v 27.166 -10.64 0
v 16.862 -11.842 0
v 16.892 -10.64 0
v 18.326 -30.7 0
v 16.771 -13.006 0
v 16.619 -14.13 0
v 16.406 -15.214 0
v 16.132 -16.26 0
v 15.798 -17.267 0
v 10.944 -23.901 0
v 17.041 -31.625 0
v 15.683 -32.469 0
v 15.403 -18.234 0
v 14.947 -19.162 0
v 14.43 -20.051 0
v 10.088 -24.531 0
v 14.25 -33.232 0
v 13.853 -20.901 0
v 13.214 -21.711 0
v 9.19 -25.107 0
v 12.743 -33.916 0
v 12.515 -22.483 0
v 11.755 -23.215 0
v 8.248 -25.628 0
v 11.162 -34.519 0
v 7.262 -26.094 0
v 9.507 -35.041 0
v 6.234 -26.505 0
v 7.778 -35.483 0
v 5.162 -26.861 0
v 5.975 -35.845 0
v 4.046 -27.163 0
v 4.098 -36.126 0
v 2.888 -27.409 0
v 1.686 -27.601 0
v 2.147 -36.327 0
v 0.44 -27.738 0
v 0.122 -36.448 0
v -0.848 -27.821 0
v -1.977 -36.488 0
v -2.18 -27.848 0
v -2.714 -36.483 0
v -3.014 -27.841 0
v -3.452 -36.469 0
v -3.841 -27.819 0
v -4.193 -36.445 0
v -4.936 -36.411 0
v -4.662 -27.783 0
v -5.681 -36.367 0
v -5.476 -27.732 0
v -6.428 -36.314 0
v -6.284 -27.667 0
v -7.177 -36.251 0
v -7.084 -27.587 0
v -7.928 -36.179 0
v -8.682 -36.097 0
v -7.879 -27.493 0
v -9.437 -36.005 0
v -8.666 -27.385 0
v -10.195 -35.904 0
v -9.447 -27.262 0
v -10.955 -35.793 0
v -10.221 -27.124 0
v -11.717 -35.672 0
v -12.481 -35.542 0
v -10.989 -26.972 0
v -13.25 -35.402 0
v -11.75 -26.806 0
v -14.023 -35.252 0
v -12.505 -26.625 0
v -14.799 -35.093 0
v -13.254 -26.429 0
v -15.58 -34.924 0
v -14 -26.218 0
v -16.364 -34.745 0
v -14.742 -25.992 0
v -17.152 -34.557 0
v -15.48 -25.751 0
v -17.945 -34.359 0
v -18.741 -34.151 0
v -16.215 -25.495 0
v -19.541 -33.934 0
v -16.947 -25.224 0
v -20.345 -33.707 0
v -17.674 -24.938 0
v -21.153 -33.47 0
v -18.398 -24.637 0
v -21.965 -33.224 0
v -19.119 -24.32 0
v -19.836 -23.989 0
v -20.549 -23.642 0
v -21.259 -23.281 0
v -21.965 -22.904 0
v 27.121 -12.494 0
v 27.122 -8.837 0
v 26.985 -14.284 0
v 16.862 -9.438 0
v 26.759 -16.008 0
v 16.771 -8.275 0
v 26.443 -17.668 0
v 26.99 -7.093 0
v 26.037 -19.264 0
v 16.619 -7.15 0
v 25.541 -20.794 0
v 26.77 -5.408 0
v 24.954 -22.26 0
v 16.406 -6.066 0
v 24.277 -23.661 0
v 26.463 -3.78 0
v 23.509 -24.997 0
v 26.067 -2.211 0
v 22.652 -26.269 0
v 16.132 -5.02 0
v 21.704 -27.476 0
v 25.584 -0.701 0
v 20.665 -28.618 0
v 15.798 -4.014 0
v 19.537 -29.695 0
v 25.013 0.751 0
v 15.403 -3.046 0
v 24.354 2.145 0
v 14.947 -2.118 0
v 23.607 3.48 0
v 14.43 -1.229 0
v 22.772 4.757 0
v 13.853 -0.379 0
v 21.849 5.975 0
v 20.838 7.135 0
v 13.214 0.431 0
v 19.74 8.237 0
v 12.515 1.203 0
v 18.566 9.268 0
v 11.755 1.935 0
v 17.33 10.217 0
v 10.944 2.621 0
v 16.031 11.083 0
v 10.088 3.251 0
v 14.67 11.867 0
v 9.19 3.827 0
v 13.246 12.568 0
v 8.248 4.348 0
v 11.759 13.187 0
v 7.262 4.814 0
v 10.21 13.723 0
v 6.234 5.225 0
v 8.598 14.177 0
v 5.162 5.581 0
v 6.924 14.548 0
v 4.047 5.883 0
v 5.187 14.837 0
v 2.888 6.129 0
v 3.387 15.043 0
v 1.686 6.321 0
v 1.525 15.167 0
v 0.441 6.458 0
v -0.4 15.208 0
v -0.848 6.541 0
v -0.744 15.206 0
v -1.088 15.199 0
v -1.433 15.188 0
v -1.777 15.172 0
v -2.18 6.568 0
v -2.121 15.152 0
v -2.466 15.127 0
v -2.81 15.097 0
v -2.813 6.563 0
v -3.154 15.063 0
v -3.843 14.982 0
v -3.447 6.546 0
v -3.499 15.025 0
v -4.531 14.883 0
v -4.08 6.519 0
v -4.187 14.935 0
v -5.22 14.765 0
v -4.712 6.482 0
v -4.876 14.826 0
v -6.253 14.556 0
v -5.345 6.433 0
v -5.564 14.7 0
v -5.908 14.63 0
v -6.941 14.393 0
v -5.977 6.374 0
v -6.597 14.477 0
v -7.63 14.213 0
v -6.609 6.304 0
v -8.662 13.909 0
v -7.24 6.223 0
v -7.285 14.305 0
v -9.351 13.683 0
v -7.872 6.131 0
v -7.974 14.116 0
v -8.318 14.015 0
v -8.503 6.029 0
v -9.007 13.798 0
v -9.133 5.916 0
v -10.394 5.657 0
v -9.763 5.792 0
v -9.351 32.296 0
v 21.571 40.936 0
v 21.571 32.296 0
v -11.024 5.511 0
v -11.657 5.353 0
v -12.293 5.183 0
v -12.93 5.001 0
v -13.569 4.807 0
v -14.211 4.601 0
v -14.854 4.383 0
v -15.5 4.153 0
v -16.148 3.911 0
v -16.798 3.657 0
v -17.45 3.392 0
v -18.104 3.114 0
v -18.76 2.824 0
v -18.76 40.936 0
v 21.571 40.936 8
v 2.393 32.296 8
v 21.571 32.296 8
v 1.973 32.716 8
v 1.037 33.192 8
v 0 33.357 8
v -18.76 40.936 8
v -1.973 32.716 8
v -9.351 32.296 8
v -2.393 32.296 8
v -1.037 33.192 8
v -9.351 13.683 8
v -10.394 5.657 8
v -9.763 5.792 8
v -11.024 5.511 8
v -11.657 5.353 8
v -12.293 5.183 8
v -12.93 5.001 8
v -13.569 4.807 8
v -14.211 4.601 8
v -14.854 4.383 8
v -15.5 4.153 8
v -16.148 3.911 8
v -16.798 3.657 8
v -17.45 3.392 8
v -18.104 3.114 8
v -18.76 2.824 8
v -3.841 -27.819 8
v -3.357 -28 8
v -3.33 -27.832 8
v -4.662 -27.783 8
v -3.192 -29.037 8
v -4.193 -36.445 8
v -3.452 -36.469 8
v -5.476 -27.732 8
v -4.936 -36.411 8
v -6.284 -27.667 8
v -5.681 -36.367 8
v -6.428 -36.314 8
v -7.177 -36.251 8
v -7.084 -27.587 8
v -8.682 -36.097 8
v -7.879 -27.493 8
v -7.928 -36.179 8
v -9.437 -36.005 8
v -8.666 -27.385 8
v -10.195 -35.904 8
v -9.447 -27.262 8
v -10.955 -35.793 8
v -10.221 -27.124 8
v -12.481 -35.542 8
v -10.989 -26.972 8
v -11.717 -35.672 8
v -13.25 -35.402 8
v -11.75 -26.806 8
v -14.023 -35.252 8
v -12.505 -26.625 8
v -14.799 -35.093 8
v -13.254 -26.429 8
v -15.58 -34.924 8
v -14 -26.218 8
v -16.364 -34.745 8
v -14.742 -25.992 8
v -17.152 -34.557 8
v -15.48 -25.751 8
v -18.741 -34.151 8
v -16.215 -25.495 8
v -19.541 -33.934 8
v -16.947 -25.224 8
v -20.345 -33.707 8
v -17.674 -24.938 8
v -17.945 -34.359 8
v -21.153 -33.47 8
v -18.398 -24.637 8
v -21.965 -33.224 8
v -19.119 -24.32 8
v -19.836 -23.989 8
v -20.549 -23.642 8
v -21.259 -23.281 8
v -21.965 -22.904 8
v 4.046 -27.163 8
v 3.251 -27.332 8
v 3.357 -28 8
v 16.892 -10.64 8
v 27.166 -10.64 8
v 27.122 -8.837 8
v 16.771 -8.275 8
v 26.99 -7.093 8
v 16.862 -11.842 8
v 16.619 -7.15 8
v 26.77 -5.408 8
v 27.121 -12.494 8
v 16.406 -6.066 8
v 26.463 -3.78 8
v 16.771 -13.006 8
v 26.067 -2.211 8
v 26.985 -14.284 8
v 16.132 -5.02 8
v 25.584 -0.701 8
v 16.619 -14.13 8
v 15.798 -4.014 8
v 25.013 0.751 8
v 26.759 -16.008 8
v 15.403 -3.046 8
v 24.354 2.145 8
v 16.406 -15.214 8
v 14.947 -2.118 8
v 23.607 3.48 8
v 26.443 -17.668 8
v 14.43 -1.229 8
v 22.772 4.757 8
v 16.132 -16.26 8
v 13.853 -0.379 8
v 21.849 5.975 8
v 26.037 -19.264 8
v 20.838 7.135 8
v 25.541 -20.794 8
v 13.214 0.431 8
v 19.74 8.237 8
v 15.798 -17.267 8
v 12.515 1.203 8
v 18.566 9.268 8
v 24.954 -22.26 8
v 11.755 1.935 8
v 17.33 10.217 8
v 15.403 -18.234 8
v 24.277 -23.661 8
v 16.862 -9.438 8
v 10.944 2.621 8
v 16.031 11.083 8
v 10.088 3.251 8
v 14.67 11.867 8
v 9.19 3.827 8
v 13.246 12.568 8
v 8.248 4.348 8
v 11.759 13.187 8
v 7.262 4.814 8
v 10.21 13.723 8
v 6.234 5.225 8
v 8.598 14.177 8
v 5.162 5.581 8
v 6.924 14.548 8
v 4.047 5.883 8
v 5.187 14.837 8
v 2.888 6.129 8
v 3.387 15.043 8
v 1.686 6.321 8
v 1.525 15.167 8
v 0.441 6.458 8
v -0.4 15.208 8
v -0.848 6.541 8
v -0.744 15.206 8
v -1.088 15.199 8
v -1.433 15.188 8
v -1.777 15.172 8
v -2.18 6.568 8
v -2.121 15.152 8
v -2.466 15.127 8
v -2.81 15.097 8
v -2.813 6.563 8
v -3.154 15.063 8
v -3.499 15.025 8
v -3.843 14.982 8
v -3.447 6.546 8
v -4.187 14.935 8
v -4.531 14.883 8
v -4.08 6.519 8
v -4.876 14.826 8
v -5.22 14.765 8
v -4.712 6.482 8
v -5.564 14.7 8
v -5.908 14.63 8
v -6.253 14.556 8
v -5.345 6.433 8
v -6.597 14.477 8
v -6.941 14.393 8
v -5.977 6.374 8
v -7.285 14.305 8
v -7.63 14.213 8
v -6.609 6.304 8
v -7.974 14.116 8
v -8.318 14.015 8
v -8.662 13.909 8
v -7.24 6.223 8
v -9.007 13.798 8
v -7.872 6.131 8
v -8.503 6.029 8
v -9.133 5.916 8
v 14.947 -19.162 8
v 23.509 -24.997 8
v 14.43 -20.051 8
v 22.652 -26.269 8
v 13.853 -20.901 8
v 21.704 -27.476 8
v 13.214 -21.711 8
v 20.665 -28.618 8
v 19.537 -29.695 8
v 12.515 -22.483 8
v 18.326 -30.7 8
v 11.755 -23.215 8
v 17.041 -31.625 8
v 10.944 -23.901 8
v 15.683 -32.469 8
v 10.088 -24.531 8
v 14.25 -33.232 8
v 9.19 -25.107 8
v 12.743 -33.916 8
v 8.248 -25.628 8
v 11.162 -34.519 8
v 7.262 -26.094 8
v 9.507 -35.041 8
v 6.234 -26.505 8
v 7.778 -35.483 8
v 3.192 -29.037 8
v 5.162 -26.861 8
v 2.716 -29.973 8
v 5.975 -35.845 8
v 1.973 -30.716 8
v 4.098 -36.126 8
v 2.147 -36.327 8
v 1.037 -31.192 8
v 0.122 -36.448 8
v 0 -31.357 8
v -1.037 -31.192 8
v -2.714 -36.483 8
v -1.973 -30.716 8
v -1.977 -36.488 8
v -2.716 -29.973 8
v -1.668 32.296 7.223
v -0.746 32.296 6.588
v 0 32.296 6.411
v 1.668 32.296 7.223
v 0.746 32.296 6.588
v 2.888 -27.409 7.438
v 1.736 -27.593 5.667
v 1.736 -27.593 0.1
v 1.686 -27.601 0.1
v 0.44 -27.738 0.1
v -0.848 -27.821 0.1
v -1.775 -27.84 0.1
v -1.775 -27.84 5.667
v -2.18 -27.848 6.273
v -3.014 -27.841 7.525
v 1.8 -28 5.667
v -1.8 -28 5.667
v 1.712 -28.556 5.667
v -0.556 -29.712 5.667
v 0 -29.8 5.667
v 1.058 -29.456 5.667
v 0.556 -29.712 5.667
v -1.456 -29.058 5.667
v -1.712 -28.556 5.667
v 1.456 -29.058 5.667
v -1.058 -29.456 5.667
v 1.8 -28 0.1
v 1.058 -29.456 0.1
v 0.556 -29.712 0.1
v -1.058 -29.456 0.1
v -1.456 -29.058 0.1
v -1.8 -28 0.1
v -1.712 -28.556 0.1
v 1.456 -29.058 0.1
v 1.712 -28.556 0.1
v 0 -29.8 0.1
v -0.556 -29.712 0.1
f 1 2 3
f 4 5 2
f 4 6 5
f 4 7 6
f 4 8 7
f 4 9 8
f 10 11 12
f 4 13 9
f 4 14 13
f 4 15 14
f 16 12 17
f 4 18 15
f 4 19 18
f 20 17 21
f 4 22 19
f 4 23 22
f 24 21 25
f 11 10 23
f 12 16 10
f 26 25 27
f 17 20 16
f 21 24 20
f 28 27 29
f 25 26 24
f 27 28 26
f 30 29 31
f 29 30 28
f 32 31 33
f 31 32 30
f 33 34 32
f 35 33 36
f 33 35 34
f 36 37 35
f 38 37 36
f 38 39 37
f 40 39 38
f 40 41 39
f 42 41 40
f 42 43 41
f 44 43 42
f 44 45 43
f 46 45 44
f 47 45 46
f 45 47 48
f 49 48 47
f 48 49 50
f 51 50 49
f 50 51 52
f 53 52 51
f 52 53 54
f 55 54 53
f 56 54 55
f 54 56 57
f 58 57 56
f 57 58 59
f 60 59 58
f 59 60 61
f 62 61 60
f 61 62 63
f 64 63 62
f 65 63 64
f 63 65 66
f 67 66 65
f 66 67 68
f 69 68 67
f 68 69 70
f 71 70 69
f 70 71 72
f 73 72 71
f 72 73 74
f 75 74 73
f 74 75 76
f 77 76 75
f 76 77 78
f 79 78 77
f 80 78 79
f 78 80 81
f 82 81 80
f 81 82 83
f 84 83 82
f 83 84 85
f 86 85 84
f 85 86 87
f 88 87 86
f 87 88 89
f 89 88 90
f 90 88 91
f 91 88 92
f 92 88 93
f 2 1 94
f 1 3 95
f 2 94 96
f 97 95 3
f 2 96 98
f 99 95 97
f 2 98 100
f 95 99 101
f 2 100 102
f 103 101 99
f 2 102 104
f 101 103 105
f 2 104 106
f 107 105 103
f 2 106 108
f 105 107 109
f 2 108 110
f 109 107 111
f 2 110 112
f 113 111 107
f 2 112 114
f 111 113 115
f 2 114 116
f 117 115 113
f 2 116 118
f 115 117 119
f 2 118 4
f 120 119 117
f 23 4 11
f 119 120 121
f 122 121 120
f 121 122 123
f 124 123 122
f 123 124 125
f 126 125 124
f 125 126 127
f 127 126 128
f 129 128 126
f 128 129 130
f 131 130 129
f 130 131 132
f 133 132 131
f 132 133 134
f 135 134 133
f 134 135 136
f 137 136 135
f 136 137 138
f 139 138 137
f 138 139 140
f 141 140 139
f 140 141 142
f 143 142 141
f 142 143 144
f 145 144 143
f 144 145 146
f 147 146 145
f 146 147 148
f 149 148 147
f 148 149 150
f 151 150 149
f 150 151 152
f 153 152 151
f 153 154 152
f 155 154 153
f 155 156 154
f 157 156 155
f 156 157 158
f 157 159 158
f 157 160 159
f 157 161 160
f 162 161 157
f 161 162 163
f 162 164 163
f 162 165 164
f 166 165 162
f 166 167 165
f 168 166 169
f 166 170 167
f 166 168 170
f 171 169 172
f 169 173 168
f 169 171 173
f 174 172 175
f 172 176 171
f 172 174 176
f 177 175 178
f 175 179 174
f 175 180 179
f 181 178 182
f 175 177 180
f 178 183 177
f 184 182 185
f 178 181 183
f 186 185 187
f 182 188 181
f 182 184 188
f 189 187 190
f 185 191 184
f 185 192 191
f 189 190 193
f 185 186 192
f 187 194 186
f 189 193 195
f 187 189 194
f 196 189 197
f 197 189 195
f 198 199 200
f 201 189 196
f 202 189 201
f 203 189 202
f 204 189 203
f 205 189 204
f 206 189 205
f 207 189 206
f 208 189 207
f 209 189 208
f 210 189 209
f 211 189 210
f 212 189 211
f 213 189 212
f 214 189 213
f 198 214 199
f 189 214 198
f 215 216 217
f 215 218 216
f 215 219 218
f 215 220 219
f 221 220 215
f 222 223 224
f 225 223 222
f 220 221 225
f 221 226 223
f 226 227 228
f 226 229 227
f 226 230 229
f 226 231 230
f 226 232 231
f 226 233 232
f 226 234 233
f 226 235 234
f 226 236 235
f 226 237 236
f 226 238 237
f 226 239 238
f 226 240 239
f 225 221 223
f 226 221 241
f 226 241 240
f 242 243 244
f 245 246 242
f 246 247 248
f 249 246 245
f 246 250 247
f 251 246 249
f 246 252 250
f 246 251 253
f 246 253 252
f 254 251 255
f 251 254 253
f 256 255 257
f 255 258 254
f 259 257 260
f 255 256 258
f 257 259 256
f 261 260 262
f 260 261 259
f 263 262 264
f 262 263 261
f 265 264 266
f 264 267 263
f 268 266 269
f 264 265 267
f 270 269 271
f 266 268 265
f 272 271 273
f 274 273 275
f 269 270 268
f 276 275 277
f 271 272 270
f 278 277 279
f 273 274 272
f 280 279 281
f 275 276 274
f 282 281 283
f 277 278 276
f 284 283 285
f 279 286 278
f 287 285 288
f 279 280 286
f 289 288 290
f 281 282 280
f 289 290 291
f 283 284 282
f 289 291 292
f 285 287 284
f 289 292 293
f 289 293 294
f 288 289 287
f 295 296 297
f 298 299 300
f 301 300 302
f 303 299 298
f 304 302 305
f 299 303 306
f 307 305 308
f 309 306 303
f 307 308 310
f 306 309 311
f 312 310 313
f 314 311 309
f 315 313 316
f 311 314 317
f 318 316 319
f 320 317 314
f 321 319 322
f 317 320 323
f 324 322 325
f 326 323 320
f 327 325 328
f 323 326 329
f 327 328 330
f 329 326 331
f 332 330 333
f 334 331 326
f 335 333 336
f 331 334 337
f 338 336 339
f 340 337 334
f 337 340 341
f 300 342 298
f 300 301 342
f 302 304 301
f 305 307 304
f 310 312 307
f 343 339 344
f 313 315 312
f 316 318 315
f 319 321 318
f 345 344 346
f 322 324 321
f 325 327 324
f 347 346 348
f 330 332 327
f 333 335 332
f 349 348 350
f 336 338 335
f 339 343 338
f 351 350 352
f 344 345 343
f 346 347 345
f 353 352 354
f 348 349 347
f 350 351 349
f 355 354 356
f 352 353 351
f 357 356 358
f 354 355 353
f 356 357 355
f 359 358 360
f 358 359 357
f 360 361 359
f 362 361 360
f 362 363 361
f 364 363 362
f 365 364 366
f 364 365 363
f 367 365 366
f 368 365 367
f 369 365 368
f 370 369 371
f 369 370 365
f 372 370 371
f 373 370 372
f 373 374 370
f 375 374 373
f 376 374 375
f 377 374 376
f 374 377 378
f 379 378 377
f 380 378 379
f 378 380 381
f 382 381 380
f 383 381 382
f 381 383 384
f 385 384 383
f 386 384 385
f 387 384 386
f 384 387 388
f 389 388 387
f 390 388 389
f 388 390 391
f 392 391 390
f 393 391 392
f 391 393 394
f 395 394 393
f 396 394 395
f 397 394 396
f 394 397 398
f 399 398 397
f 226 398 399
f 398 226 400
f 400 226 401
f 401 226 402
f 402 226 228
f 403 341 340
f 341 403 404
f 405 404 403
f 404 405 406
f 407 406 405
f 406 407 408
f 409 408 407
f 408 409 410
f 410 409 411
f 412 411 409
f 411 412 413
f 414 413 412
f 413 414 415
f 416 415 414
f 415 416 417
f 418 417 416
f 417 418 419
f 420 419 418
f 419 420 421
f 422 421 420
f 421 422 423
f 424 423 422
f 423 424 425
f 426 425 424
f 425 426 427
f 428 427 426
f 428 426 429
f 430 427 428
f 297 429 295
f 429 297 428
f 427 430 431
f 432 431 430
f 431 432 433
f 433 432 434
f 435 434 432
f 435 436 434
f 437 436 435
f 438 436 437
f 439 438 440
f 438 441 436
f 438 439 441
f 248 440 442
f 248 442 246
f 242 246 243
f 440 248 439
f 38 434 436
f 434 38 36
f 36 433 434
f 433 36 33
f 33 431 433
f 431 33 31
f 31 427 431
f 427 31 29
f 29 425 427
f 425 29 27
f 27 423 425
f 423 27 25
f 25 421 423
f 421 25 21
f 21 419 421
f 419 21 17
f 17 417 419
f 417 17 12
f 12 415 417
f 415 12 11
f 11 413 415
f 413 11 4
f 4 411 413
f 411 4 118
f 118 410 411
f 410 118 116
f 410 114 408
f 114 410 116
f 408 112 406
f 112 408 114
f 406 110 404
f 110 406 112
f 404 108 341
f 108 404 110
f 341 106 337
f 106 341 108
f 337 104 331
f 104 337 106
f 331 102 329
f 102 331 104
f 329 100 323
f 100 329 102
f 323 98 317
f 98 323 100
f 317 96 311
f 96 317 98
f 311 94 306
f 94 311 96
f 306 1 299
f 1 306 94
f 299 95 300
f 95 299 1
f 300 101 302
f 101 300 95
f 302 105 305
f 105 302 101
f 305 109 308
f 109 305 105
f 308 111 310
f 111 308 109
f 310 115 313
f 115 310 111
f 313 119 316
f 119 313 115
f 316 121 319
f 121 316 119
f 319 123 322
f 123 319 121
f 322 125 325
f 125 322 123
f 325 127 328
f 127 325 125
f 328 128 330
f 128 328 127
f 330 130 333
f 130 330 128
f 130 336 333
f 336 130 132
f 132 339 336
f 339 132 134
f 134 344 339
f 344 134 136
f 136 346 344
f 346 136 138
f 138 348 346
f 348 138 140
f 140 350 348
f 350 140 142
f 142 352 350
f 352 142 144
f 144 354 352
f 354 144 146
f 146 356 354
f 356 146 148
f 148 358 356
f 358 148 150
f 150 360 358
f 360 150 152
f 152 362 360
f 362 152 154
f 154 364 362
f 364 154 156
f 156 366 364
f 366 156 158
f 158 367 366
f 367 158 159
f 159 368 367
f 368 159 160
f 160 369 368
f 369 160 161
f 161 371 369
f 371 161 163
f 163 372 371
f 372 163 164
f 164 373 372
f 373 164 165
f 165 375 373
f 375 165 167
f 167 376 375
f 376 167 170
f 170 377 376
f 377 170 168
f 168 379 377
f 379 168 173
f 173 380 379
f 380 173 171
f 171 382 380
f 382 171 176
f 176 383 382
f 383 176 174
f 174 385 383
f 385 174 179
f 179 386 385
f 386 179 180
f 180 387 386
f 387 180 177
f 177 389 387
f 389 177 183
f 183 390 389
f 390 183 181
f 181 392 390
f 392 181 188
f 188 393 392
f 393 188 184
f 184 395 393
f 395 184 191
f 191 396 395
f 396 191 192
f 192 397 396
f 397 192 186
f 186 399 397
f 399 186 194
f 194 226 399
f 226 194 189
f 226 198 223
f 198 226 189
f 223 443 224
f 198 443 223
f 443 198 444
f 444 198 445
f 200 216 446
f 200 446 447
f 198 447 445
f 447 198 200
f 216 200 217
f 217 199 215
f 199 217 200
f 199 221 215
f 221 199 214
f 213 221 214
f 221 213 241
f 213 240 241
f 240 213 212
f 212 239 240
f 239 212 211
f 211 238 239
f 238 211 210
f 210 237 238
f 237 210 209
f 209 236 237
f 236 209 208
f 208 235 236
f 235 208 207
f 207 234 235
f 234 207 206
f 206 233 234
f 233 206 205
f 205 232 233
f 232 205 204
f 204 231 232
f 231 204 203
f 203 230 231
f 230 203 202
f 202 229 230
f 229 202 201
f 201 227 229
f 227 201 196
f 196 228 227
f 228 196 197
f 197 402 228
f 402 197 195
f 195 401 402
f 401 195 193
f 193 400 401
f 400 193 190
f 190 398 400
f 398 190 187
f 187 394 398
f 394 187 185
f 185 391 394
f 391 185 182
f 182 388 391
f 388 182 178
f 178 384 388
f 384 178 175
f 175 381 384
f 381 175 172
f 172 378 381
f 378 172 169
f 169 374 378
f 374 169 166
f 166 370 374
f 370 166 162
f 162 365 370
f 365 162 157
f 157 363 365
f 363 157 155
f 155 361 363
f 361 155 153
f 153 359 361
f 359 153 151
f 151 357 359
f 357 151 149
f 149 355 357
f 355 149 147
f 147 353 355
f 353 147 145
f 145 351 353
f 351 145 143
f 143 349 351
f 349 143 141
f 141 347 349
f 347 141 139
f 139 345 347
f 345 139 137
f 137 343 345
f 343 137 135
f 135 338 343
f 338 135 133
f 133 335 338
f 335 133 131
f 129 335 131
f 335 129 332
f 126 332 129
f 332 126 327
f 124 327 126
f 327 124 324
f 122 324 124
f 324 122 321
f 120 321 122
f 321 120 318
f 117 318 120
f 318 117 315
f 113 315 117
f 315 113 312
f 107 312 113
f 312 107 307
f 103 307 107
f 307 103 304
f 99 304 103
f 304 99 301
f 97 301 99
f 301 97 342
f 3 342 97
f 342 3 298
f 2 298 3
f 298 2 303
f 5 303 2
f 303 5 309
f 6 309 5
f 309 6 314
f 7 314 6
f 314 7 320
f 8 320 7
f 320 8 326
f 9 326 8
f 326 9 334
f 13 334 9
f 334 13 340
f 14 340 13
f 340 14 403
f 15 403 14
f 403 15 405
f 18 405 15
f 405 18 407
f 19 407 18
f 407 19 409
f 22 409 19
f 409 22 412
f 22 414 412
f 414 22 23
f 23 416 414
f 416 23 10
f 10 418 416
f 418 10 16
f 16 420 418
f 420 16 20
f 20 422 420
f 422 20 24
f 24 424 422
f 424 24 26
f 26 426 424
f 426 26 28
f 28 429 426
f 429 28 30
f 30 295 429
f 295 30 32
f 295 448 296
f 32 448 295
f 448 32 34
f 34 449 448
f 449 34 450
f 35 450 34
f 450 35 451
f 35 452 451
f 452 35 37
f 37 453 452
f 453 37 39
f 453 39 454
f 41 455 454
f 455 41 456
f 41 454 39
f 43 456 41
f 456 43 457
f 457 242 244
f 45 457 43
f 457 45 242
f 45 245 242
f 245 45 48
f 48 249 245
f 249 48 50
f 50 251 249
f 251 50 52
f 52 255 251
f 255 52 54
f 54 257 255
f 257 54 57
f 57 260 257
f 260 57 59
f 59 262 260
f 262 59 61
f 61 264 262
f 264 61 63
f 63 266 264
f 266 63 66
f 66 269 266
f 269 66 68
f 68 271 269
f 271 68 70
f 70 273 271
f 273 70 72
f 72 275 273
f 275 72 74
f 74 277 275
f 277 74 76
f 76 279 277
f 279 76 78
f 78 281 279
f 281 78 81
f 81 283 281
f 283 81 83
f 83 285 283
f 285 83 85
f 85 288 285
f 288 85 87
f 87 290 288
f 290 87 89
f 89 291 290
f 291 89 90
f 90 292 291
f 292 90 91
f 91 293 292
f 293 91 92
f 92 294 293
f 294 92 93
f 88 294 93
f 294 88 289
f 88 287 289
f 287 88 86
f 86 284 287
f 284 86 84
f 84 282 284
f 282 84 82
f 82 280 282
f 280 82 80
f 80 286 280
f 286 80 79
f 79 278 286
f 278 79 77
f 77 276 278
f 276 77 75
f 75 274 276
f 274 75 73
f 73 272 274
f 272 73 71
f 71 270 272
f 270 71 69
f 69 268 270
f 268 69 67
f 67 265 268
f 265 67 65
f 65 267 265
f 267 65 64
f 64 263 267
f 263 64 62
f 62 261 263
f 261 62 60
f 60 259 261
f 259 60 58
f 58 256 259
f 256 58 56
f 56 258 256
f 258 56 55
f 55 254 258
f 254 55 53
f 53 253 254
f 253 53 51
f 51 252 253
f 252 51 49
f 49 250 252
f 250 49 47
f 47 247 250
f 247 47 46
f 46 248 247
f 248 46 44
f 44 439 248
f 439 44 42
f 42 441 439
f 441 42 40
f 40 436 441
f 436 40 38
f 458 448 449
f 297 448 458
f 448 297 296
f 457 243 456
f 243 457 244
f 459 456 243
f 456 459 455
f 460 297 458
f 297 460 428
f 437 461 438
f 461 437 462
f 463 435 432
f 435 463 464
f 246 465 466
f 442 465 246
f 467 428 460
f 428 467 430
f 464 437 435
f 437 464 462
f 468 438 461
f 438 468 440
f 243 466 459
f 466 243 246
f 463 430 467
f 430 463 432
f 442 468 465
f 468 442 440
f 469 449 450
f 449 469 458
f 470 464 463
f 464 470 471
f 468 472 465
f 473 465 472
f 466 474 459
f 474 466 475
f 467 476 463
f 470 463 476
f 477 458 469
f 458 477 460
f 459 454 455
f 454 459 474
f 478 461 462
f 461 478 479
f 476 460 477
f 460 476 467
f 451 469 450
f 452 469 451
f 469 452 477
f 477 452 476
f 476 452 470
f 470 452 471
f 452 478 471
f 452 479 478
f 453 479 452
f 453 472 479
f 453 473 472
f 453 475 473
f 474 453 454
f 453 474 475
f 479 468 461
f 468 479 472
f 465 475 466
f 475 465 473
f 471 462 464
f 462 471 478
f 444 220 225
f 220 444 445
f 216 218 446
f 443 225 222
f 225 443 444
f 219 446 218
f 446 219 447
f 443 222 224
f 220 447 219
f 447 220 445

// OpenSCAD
// Street Numbers for 3D printing
// Charles Tilford, 2019
// License: CC BY-NC-SA 4.0
//   https://creativecommons.org/licenses/by-nc-sa/4.0/

char="5";     // The number/letter to print

// Units are in mm, except for height of letter

// How many inches high should letter be?
inchesHigh=3;
// How thick/deep should letter be (mm)?
depth=8;

// Character coordinates just center the letter
charX=-30;    // Character X coord
charY=-35;    // Character Y coord
topScrew=30;  // Top screw Y coord
botScrew=-28; // Bottom screw Y coord
height=8;     // Thickness of character
// Screw dimensions. Default presumes
// #6 sheet metal screw
screwWid=3.6; // Width of screw shaft
screwTop=6.78;// Width of screw head
screwCon=5.08;// Height of head 'cone'

// Font to print in. Your system needs this
// installed, of course. If changed the hole
// positions almost certainly need to be
// changed, and maybe charX/charY.
fName="Open Sans Extrabold";
// https://fonts.google.com/specimen/Open+Sans
// Designer: Steve Matteson

// Thin floor below holes. My printer was
// struggling to have the hole 'border' stick
// to the stage. Just drill/screw thru it.
holeFloor=0.1; 

// ==========================================
// ===== All values below are auto-calculated
// ==========================================

// Scaled values
scaleFactor=inchesHigh / 3;
cX=charX * scaleFactor;
cY=charY * scaleFactor;
tS=topScrew * scaleFactor;
bS=botScrew * scaleFactor;
// Where do we start drawing screw head cone?
oS=depth - (screwCon-.05);

difference() {
  // We use difference() to punch out the screw holes
  // in the character
    
  // The character itself, 8mm thick
  translate([cX,cY,0])
    linear_extrude(height=depth, scale=1)
    text(char, size=(75*scaleFactor),
         $fn=100, font=fName);
    
  // Bottom screw hole
  translate([0,bS,oS]) color("red")
    cylinder(h=screwCon, d2=screwTop,
             d1=0, $fn=20);
   translate([0,bS,holeFloor])
    cylinder(h=20, d=screwWid, $fn=20);
    
  // Top screw hole
  translate([0,tS,oS]) color("red")
    cylinder(h=screwCon, d2=screwTop,
             d1=0, $fn=20);
  translate([0,tS,holeFloor])
    cylinder(h=20, d=screwWid, $fn=20);
}

// Colors are just to aid visualization of
// void spaces. $fn is "featuer number", ie how
// many polygons are devoted to object. The values
// above should be near your printing limit anyway.

// Developed in OpenSCAD
//    https://www.openscad.org/
